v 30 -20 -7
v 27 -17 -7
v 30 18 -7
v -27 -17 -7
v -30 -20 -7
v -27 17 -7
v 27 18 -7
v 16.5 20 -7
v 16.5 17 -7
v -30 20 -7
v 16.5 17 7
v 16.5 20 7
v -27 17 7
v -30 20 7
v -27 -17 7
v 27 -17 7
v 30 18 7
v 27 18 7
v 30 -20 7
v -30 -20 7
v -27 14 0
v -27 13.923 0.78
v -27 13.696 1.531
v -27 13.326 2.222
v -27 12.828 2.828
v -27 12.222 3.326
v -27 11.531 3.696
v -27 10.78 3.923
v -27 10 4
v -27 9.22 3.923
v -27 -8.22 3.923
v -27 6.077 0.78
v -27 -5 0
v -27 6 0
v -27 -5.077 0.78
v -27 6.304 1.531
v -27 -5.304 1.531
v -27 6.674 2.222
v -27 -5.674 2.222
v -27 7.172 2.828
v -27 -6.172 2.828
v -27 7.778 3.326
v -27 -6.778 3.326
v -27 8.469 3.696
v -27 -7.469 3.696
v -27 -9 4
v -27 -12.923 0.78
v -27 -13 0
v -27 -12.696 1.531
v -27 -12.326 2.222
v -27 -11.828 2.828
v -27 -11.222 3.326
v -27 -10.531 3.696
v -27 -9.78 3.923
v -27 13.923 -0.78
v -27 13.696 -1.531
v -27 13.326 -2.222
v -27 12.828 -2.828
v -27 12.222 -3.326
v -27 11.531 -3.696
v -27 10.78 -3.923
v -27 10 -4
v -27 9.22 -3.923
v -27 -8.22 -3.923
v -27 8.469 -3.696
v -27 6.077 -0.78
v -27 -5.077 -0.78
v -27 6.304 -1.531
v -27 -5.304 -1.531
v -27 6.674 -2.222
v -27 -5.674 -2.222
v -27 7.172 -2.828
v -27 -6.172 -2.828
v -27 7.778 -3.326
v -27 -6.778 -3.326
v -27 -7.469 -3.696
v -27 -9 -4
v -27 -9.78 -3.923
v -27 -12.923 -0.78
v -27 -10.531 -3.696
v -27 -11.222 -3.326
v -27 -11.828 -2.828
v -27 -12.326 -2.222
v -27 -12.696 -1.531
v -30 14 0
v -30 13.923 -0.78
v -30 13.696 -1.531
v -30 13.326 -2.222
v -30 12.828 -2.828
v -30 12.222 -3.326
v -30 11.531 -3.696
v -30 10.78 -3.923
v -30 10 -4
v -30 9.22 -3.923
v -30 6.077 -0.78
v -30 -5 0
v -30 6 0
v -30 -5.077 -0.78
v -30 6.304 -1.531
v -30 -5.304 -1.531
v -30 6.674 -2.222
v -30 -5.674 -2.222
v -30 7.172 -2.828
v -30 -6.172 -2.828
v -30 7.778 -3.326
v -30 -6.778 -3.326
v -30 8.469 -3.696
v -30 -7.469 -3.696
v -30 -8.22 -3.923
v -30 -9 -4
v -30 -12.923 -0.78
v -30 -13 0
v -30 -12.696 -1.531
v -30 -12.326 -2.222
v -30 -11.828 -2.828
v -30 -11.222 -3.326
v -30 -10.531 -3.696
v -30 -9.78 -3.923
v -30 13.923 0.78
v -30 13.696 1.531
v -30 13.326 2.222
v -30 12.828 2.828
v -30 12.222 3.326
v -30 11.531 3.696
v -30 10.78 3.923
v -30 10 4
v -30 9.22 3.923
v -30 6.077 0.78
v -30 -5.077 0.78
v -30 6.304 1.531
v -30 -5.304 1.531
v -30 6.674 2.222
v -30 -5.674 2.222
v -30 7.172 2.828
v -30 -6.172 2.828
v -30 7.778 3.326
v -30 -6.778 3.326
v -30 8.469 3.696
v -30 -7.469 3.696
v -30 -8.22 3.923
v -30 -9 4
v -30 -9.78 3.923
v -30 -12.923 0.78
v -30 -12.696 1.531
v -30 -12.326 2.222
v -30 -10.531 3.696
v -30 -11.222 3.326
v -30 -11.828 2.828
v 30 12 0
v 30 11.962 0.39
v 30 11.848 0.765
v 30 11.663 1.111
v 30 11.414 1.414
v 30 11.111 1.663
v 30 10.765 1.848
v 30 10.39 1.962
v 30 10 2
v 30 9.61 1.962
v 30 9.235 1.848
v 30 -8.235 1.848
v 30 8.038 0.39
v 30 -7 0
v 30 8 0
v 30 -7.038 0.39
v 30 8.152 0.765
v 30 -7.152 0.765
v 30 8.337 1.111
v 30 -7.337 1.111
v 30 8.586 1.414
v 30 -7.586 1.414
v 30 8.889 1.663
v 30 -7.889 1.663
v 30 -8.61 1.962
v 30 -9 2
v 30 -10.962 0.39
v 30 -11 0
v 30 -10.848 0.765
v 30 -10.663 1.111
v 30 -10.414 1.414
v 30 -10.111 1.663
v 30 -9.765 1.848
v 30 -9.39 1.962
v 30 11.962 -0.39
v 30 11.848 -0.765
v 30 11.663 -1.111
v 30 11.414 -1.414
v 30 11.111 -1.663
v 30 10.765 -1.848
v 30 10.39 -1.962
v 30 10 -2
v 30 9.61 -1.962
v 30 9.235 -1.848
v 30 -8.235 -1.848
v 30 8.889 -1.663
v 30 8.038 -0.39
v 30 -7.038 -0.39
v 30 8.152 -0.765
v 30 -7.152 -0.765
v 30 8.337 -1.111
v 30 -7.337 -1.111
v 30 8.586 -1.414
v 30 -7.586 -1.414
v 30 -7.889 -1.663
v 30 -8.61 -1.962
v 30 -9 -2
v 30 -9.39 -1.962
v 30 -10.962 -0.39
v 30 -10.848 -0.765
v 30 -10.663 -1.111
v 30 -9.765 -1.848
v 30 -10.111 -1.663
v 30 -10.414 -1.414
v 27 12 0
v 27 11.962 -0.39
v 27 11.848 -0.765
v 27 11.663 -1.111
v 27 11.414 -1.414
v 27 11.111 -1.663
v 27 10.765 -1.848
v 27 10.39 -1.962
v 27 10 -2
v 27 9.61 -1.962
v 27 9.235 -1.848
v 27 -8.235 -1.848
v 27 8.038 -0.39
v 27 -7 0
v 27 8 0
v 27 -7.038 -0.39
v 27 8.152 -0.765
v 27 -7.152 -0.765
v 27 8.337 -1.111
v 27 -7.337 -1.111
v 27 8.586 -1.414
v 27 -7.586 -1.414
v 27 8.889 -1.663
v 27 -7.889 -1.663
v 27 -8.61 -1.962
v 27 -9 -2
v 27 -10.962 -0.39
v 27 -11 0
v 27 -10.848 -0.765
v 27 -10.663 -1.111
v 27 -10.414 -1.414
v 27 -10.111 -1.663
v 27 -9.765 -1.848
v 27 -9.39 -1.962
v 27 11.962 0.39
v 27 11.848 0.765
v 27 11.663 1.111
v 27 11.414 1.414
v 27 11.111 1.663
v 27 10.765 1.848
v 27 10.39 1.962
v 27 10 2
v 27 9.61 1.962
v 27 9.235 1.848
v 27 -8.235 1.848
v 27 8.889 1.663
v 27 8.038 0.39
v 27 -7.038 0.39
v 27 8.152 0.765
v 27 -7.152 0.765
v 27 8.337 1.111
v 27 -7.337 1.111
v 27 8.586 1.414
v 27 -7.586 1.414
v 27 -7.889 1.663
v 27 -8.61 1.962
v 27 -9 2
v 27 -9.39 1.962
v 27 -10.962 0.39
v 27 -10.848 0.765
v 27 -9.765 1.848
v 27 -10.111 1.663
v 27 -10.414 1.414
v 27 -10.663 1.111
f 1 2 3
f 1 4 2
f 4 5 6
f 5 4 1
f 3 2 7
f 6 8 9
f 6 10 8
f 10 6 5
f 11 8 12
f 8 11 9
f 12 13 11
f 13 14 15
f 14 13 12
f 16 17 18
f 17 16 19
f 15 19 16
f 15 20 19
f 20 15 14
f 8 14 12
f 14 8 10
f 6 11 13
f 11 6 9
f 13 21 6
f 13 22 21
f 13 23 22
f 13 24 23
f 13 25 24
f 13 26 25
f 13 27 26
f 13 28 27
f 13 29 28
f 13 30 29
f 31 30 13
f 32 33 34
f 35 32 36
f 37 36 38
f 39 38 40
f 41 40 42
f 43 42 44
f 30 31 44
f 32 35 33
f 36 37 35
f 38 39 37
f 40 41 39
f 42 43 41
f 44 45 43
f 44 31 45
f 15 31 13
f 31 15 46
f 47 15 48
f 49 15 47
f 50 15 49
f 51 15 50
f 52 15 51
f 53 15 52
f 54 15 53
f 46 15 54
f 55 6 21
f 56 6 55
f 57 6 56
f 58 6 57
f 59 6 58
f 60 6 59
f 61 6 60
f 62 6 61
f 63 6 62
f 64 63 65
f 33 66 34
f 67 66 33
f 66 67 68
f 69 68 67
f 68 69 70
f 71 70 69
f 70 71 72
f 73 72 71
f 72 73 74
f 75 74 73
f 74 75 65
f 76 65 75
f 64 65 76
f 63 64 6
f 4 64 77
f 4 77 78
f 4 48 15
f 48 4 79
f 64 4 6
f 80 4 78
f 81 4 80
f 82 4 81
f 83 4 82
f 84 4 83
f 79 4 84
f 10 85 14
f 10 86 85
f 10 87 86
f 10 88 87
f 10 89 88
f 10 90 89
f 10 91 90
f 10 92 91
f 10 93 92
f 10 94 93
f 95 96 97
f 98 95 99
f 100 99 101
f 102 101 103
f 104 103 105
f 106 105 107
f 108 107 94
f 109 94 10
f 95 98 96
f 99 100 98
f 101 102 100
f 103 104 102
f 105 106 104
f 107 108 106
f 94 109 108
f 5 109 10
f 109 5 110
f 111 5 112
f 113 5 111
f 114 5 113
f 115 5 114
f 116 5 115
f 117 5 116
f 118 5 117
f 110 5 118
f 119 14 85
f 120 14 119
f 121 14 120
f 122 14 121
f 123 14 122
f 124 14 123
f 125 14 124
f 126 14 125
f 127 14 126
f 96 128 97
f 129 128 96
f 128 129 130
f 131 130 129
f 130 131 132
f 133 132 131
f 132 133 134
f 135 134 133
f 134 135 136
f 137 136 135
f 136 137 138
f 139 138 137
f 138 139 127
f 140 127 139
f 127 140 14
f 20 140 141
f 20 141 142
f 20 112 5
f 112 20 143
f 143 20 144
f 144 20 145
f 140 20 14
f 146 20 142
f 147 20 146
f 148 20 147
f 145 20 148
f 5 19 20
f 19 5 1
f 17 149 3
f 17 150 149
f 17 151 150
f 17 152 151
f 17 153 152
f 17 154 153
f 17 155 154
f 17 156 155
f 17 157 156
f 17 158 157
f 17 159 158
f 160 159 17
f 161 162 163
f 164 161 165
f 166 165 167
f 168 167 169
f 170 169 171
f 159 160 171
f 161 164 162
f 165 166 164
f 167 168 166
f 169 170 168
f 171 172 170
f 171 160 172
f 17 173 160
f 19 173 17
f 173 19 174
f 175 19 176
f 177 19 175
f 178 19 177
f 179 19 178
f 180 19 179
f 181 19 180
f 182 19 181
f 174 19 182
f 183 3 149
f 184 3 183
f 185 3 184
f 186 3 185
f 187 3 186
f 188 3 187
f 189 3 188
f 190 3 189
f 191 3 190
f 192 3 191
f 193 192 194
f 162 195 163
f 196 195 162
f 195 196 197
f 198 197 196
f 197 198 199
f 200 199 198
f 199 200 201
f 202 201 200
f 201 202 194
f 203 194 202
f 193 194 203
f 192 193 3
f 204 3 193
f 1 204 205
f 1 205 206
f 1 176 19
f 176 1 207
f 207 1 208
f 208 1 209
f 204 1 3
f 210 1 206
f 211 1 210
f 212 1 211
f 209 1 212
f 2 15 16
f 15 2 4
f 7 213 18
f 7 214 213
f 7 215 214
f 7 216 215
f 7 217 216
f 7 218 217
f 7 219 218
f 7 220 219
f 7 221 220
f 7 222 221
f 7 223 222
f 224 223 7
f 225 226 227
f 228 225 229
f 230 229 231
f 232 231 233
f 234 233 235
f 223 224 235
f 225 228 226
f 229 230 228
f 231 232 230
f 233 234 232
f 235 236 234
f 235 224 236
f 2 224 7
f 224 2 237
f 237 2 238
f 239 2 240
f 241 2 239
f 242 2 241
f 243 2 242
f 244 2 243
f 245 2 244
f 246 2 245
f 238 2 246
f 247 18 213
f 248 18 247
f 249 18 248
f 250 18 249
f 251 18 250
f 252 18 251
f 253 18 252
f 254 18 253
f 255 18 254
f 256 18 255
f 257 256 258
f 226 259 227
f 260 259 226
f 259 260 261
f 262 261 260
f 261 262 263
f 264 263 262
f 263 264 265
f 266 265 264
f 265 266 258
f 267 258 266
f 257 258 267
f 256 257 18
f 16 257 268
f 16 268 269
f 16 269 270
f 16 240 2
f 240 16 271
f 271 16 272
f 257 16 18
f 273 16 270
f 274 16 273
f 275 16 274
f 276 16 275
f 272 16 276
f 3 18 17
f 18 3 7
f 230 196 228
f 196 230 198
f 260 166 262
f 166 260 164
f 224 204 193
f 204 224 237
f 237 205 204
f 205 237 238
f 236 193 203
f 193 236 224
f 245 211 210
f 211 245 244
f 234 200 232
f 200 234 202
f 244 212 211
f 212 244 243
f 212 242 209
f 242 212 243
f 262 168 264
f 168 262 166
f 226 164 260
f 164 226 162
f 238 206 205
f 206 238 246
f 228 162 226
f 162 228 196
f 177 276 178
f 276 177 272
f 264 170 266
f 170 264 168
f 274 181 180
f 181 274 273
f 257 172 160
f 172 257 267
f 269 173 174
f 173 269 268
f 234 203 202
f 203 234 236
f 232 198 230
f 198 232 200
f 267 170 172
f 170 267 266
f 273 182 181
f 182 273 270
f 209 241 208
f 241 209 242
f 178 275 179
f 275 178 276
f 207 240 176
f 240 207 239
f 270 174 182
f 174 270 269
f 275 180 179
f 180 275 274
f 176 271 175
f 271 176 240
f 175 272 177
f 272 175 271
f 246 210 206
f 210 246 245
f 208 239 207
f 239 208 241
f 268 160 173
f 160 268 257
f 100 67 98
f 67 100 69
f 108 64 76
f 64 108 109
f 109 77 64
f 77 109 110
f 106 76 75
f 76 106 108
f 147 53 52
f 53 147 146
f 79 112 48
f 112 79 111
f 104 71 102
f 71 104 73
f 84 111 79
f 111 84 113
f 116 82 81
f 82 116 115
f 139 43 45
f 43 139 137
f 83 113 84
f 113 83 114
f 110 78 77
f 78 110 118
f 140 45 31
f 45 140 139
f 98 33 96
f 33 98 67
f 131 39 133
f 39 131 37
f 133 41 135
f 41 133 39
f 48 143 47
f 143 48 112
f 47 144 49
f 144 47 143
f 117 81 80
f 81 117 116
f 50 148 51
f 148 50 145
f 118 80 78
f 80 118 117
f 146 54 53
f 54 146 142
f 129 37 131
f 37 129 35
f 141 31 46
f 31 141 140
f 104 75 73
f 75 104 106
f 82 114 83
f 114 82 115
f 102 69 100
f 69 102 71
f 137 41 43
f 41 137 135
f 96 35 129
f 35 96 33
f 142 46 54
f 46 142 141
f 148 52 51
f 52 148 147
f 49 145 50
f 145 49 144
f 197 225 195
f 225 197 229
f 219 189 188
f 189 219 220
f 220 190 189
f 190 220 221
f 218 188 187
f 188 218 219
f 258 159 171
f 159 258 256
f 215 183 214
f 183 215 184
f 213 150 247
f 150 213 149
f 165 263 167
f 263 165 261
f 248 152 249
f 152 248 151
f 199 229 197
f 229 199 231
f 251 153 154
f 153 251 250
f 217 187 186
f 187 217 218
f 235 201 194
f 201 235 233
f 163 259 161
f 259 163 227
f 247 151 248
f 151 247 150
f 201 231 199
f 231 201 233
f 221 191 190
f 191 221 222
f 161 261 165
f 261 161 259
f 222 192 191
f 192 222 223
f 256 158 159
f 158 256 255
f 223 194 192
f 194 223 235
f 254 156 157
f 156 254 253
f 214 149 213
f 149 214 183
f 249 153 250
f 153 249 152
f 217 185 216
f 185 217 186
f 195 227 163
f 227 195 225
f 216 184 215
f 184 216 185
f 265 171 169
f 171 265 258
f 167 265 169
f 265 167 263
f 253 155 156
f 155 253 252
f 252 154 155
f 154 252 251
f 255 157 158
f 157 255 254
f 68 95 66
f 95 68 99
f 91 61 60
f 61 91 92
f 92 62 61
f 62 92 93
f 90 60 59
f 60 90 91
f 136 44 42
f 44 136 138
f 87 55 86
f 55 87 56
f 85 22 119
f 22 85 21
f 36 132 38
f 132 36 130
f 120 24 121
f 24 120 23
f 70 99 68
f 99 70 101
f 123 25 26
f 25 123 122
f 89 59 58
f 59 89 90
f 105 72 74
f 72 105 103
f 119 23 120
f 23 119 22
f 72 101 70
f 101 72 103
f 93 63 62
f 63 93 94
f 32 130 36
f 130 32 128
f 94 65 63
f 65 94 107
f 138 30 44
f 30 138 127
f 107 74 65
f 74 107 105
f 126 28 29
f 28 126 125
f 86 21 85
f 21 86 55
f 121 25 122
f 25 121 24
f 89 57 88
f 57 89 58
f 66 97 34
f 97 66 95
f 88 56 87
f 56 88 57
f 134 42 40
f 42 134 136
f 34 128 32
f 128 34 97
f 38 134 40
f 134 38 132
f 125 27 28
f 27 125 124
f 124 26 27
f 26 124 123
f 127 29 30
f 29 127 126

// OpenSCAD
// Height [mm]
height = 60; // [10:1:100]
// Wall strength [mm]
wall = 3; // [1:0.2:10]
// Width [mm]
width = 14; // [10:0.2:40]
// Length [mm]
length = 40; // [10:1:80]
// Clamp height [mm]
clamb_height = 45; // [10:1:100]
// Top Length [mm]
top_length = 38; // [10:1:80]

// Number of screw holes [mm]
num_holes = 2; // [1:1:10]
// Small hole radius [mm]
radius = 2; // [1:0.2:4]

rotate([0,90,0])
difference(){
    union() {
        translate([0,length/2-wall/2,-height/2+clamb_height/2+wall/2])
        cube([width, wall, clamb_height], center=true);
        translate([0,0,-height/2+wall/2])
        cube([width, length, wall], center=true);
        translate([0,-length/2+wall/2,0])
        cube([width, wall, height], center=true);
        translate([0,-length/2+top_length/2,height/2-wall/2])
        cube([width, top_length, wall], center=true);
    }
    
    for(i = [0:(num_holes-1)]){
        translate([0,top_length/num_holes*i-length/2+top_length/num_holes/2+wall/2,height/2-(wall+2)/2-1])
        cylinder(r=radius, h=wall+2, $fn=32);
        translate([0,top_length/num_holes*i-length/2+top_length/num_holes/2+wall/2,-height/2-(wall+2)/2+1])
        cylinder(r=radius+2, h=wall+2, $fn=32);
    }
}
